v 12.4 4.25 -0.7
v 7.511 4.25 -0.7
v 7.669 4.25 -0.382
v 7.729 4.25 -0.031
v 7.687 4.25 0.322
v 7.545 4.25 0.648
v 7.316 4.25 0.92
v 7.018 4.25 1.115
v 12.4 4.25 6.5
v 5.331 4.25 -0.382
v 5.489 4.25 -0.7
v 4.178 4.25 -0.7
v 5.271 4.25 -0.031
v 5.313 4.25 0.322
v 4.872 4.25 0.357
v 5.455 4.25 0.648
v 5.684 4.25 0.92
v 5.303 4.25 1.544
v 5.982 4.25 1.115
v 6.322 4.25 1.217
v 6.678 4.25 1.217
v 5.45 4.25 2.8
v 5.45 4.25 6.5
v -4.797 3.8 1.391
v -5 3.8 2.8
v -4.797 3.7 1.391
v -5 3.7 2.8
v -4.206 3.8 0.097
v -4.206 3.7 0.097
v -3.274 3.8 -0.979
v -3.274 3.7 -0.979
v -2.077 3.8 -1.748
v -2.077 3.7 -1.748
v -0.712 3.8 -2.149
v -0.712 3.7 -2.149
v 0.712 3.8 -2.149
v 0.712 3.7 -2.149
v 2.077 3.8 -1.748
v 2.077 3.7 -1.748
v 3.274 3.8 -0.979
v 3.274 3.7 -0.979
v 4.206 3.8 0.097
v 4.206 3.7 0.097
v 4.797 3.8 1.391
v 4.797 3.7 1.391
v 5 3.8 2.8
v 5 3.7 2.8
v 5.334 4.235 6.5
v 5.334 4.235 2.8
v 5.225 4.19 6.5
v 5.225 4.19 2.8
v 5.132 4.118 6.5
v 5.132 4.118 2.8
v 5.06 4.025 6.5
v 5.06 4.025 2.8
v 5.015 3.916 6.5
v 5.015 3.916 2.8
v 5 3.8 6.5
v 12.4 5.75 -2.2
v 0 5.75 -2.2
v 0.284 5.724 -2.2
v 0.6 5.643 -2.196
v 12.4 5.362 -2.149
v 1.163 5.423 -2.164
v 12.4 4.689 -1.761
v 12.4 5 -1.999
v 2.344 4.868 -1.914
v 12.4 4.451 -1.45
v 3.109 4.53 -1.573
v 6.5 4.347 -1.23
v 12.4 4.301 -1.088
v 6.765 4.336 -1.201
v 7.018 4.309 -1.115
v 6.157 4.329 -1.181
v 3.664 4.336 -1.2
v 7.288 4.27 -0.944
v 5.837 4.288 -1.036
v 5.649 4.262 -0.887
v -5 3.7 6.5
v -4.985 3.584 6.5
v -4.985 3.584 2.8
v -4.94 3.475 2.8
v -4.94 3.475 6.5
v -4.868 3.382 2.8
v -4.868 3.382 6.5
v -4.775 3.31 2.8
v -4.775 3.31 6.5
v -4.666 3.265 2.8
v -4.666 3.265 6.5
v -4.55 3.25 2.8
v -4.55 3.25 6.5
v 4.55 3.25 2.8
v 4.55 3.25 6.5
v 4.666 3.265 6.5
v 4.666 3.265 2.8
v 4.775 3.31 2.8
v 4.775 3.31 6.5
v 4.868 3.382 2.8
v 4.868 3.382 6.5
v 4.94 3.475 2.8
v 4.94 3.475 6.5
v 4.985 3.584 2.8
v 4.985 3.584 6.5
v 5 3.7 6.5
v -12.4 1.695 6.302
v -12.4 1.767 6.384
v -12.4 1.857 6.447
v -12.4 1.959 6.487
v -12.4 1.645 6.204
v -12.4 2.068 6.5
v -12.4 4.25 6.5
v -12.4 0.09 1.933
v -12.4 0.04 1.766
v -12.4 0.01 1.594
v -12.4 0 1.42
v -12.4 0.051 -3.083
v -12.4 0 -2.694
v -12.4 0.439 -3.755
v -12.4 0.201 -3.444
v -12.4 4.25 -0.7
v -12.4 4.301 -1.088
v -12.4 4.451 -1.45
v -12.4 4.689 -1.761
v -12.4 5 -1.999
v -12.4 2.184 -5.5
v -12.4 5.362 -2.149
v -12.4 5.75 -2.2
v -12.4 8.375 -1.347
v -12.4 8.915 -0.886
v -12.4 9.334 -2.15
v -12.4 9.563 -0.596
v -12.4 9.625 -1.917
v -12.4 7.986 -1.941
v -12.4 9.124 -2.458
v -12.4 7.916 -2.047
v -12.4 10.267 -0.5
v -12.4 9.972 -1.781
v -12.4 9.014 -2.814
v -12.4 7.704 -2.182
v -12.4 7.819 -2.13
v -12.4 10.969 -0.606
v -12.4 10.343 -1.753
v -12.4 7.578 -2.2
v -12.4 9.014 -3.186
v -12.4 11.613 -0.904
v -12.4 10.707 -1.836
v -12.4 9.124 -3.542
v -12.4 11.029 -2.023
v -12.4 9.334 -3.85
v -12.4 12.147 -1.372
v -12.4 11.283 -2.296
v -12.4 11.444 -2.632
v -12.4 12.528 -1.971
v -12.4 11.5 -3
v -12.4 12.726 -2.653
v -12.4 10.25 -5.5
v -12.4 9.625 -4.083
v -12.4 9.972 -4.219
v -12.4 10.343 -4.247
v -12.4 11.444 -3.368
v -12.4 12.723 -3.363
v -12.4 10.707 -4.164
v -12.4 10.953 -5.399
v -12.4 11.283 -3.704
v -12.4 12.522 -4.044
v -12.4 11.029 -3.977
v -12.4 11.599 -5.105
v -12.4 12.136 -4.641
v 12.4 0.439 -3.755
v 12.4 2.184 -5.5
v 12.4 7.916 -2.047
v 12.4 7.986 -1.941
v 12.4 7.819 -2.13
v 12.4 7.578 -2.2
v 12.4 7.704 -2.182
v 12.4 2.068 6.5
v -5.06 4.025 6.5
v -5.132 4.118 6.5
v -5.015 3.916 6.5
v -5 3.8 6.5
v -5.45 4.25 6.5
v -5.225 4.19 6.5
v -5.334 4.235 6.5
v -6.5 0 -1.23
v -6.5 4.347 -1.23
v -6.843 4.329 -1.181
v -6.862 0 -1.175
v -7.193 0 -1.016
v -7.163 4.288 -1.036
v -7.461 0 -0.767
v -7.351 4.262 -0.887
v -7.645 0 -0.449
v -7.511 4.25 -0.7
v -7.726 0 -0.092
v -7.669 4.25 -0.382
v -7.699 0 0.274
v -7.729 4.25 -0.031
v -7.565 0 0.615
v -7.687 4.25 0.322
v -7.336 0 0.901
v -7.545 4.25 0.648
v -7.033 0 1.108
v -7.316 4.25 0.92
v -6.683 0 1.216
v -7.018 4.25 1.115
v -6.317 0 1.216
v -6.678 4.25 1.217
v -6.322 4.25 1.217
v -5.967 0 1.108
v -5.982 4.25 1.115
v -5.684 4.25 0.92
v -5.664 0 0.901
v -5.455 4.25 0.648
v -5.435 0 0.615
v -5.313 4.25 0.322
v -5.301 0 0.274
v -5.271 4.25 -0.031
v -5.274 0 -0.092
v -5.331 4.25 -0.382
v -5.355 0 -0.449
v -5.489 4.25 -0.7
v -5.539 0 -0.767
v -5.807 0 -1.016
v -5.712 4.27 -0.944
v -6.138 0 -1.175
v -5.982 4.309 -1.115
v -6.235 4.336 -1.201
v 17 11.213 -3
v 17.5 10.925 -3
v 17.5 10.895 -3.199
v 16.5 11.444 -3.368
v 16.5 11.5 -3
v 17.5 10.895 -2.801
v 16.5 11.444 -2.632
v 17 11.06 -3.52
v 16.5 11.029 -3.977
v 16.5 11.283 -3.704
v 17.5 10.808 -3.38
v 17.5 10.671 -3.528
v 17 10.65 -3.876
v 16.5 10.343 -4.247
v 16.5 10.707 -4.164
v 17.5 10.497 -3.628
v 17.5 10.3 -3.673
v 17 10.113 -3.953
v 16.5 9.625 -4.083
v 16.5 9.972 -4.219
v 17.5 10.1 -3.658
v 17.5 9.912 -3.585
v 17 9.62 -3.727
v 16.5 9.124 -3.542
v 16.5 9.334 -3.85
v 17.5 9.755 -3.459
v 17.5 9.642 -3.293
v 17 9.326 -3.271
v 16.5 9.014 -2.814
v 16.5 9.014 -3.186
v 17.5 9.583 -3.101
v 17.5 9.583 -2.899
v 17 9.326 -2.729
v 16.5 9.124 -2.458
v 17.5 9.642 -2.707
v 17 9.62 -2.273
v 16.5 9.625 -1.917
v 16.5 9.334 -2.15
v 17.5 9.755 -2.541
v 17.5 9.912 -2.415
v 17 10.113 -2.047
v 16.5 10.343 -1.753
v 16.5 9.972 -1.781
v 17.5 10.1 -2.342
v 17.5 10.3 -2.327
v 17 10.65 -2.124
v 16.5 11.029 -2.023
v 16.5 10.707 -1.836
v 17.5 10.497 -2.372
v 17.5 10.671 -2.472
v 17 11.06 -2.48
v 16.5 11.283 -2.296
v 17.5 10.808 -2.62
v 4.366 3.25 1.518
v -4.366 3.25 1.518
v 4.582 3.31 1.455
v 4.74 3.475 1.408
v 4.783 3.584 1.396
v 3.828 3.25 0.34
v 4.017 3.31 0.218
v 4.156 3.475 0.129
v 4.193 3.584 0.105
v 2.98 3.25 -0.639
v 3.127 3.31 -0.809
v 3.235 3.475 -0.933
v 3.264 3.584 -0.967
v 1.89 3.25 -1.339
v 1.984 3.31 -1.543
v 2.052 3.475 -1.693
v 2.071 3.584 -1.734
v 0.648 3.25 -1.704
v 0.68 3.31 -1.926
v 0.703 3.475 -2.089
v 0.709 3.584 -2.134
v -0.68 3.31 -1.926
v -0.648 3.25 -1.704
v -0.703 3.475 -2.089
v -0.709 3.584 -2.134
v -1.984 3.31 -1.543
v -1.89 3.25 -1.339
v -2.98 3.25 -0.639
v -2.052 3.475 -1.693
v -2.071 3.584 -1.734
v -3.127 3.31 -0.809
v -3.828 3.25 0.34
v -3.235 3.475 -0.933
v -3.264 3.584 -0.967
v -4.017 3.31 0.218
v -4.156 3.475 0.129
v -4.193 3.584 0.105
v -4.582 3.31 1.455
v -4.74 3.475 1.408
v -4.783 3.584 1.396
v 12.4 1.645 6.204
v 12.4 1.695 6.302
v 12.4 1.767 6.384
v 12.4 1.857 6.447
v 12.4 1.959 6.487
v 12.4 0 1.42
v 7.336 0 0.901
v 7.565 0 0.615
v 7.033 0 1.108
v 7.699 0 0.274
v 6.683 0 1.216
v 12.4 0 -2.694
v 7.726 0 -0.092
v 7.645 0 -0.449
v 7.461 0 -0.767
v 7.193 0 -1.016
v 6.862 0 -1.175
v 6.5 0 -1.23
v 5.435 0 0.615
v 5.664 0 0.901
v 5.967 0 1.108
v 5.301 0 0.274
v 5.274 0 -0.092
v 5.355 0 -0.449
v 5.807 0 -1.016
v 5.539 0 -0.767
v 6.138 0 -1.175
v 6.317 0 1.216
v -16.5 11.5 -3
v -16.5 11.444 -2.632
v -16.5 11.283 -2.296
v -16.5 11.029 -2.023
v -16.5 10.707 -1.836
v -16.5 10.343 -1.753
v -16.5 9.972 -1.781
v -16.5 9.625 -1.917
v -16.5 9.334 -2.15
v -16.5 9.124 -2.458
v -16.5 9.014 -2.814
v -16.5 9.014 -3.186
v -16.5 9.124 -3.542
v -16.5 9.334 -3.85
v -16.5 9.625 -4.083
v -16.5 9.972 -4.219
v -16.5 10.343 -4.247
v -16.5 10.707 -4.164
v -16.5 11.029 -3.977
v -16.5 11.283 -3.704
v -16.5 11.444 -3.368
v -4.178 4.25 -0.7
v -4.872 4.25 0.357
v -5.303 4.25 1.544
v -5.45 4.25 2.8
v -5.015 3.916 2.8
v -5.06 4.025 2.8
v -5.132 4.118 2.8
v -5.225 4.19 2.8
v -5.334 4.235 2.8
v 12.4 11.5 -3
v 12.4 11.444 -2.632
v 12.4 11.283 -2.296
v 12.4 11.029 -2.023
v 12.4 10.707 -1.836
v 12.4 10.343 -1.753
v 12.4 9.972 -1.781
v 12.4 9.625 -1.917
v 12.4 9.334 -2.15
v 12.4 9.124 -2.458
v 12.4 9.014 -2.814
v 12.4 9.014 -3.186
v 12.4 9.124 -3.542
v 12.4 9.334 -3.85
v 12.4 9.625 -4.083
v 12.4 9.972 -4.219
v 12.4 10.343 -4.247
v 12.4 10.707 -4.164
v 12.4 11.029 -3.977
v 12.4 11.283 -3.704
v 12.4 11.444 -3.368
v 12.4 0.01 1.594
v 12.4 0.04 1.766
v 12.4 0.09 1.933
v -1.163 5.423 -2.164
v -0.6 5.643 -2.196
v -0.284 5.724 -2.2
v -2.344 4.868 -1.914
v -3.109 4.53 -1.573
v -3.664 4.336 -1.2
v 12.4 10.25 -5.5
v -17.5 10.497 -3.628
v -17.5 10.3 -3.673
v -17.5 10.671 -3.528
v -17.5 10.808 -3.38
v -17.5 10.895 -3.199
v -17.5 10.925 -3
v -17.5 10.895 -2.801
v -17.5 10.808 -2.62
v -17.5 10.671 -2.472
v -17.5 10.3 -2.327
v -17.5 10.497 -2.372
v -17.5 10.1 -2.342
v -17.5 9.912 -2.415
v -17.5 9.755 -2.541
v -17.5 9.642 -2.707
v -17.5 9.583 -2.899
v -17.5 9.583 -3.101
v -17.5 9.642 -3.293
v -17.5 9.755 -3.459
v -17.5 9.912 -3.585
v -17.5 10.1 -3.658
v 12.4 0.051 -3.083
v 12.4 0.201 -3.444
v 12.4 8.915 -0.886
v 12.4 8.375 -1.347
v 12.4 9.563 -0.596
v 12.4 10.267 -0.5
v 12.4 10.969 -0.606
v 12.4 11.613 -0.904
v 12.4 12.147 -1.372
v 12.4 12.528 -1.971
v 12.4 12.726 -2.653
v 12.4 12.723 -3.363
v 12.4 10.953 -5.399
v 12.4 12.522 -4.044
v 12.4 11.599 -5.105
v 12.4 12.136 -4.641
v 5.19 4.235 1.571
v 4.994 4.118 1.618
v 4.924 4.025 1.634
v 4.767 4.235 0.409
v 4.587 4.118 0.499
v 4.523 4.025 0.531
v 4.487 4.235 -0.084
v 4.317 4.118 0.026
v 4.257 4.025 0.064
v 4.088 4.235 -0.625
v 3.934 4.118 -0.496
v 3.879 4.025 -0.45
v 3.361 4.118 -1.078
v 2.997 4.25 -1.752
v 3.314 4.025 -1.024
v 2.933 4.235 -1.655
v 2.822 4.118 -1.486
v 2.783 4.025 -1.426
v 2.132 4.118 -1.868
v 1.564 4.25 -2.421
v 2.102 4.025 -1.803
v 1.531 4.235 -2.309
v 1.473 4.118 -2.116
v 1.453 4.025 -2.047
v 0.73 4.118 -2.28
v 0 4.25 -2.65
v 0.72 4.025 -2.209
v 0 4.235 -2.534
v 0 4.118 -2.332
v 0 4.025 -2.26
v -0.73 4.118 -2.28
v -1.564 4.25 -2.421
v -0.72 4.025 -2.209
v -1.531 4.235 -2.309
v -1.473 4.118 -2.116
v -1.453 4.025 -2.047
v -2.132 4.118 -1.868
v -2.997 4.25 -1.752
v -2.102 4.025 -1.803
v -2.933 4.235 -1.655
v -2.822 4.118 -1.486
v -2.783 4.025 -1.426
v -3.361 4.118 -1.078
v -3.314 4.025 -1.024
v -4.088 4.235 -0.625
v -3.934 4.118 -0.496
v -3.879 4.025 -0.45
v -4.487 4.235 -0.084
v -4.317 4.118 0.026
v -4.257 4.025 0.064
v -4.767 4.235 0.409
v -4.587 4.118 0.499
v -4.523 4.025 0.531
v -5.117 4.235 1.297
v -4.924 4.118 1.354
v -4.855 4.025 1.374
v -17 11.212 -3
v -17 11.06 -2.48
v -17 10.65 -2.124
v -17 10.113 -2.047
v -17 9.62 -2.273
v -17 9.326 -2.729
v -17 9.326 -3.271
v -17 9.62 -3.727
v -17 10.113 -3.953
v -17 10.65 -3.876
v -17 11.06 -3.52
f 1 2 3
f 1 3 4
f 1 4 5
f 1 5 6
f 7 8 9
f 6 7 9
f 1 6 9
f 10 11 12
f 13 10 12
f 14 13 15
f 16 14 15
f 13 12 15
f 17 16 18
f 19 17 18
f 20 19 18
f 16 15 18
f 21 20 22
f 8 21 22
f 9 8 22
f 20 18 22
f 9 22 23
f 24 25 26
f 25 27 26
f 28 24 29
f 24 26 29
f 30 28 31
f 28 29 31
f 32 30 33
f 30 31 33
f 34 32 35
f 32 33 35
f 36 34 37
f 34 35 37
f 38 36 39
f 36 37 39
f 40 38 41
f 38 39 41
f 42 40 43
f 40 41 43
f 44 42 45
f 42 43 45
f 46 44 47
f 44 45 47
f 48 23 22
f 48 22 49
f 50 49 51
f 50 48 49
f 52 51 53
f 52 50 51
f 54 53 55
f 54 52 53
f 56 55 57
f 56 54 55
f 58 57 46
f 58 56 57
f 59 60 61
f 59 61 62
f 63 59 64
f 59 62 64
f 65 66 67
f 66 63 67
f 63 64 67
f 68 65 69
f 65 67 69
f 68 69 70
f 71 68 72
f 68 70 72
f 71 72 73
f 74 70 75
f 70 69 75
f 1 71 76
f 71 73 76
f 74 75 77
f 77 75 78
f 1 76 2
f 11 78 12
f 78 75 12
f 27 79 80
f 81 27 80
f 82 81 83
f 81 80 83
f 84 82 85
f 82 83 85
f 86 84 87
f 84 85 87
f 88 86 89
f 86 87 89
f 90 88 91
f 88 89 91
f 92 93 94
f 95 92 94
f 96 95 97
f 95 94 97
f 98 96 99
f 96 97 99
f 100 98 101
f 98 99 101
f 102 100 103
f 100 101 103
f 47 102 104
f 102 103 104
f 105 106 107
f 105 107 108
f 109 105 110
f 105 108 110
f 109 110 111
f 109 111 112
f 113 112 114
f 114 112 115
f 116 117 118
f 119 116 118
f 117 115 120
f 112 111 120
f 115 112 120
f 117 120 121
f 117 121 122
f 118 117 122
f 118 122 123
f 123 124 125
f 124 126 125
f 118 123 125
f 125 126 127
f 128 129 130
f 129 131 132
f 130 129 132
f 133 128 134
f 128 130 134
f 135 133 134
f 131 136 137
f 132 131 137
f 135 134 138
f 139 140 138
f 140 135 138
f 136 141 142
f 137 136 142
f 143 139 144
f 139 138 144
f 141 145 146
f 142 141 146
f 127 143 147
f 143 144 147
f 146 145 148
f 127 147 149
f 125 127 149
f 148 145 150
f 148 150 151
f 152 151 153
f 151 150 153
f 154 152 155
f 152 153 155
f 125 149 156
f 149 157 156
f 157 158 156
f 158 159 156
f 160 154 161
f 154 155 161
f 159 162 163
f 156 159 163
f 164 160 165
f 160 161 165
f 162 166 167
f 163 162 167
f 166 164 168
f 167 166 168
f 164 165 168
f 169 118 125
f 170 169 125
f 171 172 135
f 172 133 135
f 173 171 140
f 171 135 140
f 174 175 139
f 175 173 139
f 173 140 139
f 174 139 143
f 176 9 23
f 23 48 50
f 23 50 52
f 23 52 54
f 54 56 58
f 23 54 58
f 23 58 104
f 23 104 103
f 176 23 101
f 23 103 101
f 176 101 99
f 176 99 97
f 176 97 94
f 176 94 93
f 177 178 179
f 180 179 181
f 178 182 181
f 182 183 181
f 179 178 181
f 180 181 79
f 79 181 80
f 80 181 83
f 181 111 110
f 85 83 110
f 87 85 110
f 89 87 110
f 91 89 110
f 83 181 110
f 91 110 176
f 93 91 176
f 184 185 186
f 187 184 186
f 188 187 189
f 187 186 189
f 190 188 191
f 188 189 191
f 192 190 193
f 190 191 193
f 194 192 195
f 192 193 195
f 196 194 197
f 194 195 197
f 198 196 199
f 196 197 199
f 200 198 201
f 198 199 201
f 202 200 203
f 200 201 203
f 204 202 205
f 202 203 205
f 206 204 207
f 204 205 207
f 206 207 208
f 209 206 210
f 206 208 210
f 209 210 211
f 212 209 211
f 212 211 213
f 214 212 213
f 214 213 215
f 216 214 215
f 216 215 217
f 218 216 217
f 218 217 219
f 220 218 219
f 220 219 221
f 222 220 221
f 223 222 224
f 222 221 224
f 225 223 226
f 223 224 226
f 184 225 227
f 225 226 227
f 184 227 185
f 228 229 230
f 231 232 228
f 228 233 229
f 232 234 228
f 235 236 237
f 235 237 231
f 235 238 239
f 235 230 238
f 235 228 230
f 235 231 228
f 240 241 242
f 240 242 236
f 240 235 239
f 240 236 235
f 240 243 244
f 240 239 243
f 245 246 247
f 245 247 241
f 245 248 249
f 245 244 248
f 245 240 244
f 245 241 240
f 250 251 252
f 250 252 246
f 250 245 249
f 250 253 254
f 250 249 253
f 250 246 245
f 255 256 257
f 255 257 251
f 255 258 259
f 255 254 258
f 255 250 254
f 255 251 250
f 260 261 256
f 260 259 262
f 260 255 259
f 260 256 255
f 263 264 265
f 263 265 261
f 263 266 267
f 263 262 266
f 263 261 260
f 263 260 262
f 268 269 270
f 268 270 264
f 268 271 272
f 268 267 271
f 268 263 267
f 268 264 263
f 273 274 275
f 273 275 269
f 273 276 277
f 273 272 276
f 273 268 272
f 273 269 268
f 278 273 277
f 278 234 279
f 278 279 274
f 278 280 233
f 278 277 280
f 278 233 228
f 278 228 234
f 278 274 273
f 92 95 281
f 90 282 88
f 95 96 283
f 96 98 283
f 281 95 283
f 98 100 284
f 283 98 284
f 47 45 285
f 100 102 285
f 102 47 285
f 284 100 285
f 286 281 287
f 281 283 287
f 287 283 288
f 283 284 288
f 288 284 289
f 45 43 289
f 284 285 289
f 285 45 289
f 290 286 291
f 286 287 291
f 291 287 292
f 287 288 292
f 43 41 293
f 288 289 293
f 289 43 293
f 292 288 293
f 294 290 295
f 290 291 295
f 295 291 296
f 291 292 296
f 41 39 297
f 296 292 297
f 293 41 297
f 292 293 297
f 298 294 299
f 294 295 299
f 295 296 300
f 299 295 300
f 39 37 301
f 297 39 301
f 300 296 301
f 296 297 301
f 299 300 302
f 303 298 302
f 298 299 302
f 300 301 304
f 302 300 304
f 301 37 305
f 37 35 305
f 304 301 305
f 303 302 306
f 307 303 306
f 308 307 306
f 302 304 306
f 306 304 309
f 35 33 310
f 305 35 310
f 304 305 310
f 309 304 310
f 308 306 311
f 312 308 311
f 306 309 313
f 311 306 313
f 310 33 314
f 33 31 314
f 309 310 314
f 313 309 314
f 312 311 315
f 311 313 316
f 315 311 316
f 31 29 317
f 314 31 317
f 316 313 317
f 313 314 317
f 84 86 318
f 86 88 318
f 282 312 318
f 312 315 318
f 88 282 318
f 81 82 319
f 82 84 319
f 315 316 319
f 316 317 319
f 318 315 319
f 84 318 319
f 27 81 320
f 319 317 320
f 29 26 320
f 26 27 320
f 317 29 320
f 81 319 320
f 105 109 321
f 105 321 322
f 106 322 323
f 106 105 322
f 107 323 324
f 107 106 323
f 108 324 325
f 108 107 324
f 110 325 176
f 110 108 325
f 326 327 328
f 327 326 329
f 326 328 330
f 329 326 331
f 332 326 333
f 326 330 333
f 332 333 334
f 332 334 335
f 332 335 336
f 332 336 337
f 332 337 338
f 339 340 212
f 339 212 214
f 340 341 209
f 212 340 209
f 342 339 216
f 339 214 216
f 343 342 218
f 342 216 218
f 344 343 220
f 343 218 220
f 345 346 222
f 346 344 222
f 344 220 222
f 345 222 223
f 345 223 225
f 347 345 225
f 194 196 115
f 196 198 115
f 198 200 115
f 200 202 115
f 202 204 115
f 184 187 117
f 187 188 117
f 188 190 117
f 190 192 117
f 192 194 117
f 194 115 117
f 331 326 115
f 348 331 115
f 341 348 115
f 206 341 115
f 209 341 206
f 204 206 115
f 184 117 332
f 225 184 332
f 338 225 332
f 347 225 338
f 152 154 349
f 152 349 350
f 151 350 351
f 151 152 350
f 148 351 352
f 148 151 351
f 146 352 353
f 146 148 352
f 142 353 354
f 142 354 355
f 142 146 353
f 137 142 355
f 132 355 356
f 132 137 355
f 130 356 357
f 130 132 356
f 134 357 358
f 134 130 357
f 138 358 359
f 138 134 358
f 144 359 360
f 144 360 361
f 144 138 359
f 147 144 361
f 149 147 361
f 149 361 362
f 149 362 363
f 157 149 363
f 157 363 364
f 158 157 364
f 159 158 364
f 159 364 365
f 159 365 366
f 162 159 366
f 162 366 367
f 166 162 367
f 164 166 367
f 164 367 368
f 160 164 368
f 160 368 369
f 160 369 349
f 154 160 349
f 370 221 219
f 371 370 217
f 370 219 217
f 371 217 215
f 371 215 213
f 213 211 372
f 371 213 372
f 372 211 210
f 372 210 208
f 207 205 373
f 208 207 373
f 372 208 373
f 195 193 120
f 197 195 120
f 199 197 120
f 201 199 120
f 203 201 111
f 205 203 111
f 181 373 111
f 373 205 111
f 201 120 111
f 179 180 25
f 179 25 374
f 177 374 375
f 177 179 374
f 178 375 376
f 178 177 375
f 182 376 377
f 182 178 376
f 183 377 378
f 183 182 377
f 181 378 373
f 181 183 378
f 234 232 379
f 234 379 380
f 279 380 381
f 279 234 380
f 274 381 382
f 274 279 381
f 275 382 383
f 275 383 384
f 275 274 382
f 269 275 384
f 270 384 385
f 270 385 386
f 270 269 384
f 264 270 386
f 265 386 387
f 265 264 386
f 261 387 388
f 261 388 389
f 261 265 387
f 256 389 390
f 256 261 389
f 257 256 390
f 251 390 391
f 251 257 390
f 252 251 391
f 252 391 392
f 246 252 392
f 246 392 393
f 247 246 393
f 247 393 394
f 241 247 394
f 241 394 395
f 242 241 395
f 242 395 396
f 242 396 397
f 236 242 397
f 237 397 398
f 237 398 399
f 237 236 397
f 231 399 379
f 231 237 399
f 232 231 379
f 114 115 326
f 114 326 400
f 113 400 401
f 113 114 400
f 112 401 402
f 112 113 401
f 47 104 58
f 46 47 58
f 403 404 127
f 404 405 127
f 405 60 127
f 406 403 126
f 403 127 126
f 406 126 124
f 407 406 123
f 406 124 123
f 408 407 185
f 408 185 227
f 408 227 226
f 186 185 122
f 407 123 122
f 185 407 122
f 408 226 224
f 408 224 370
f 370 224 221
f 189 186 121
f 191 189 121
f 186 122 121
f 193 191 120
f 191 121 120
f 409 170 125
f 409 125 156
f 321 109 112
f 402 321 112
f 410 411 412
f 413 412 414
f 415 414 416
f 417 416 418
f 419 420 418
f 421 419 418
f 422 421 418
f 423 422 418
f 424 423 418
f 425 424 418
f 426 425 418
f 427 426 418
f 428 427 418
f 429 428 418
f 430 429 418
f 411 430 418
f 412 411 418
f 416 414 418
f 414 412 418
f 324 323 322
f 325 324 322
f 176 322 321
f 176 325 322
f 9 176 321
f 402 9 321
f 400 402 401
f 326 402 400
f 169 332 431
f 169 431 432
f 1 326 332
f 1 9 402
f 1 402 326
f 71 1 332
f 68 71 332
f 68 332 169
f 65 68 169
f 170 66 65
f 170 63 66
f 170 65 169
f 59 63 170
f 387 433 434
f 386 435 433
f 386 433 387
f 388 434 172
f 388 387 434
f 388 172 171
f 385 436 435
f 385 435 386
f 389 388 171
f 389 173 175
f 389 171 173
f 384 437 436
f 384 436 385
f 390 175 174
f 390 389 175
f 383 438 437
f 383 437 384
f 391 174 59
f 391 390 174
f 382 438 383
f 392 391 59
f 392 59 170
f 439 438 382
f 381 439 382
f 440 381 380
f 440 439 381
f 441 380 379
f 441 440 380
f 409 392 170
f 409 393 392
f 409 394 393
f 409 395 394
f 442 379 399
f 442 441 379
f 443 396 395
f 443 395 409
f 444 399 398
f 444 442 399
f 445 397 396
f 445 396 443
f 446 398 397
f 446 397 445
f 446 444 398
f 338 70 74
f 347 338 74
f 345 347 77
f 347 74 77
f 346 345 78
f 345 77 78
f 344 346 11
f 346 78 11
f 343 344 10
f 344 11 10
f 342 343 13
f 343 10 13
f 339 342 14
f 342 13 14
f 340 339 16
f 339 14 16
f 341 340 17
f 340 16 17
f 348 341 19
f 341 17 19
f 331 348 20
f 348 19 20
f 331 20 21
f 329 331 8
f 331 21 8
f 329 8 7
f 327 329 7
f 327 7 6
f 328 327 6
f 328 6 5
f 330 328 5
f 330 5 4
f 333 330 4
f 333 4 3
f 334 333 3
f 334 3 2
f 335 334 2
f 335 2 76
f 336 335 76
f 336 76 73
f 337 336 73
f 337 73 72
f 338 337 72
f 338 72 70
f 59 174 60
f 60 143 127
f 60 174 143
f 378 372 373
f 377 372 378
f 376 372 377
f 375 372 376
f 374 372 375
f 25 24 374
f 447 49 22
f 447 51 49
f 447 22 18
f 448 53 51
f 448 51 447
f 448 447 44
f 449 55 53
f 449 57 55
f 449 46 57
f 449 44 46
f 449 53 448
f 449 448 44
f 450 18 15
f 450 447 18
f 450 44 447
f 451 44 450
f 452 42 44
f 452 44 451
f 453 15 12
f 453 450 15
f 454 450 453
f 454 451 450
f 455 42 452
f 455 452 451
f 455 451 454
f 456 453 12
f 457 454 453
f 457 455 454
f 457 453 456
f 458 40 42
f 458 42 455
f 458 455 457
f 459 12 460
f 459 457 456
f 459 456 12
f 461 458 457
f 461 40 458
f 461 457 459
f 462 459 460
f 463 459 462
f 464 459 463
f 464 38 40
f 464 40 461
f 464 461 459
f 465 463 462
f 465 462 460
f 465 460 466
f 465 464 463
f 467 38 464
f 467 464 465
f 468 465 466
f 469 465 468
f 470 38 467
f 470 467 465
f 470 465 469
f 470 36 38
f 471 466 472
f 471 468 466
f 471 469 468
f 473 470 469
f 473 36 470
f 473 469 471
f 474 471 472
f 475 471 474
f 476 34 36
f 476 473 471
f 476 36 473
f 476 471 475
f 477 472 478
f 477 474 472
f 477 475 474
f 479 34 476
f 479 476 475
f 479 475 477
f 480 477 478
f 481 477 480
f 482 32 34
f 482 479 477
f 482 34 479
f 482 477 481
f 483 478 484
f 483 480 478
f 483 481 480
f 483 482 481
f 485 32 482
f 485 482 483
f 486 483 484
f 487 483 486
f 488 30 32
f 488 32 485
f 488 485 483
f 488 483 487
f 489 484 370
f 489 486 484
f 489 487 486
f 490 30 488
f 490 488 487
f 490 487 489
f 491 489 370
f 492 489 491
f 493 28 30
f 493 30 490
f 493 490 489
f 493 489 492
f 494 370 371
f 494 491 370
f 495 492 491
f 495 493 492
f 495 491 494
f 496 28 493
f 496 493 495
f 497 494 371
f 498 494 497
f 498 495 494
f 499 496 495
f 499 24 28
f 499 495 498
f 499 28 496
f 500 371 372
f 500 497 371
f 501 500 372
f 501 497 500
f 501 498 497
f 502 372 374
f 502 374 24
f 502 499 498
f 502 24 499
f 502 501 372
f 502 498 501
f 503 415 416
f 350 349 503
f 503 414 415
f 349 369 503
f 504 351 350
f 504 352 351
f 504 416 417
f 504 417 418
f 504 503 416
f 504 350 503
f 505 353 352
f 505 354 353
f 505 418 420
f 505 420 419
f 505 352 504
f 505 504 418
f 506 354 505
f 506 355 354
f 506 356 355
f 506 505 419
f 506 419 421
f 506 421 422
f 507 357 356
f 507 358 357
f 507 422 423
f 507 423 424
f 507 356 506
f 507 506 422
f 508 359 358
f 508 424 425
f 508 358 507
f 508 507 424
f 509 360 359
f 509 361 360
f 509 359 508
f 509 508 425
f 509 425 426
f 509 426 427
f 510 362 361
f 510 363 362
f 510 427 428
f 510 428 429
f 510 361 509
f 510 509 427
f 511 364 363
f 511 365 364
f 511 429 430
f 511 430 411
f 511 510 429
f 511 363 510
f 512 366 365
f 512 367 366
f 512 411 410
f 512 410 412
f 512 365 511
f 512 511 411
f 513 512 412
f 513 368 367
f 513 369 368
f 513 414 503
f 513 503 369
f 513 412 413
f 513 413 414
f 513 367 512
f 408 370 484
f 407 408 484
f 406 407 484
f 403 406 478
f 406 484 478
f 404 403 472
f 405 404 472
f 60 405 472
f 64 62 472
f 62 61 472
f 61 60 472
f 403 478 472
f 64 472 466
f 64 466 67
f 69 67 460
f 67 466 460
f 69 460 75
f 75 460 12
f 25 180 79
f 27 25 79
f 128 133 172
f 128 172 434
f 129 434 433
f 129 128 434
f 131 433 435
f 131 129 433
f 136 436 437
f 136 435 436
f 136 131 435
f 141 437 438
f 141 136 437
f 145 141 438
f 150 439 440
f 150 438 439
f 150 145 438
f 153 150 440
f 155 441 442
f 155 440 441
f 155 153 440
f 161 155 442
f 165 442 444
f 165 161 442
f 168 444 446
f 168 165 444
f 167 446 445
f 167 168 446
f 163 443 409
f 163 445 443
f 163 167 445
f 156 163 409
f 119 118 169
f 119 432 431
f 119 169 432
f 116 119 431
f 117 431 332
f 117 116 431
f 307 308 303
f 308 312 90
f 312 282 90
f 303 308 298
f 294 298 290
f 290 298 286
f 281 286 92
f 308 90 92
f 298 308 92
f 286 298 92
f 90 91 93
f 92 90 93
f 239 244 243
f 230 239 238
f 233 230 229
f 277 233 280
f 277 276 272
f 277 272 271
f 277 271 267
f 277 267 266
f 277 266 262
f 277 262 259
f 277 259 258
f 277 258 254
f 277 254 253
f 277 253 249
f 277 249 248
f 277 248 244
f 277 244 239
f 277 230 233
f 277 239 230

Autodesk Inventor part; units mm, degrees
sketch "Sketch_1" plane through (0, 0, 0) normal (1, 0, 0) x (0, 0, -1)
  line L0 (-6.5, 4.25) -> (-6.5, 2.0679)
  arc A0 (-6.5, 2.0679) -> (-6.2039, 1.645) centre (-6.05, 2.0679) ccw
  line L1 (-6.2039, 1.645) -> (-1.9329, 0.0905)
  arc A1 (-1.9329, 0.0905) -> (-1.4198, 0) centre (-1.4198, 1.5) ccw
  line L2 (-1.4198, 0) -> (2.6944, 0)
  arc A2 (2.6944, 0) -> (3.755, 0.4393) centre (2.6944, 1.5) ccw
  line L3 (3.755, 0.4393) -> (5.5, 2.1843)
  line L4 (5.5, 2.1843) -> (5.5, 10.25)
  arc A3 (5.5, 10.25) -> (1.9407, 7.9855) centre (3, 10.25) ccw
  arc A4 (2.2, 7.5779) -> (1.9407, 7.9855) centre (1.75, 7.5779) ccw
  line L5 (2.2, 7.5779) -> (2.2, 5.75)
  arc A5 (0.7, 4.25) -> (2.2, 5.75) centre (0.7, 5.75) ccw
  line L6 (0.7, 4.25) -> (-6.5, 4.25)
extrude "Extrusion1" add sketch "Sketch_1" along normal mid plane 24.8
sketch "Sketch2" plane through (-12.4, 0, -2.6944) normal (0, -1, 0) x (1, 0, 0)
  point P0 (18.9, 2.6944)
hole "Hole1" at (6.5, 0, 0) direction (0, 1, 0) diameter 2.459 depth 5.75
sketch "Sketch3" plane through (-12.4, 0, -2.6944) normal (0, -1, 0) x (1, 0, 0)
  point P0 (5.9, 2.6944)
hole "Hole2" at (-6.5, 0, 0) direction (0, 1, 0) diameter 2.459 depth 5.75
sketch "Sketch_5" plane through (0, 0, 6.5) normal (0, 0, 1) x (1, 0, 0)
  arc A0 (-5, 3.8) -> (-5.45, 4.25) centre (-5.45, 3.8) ccw
  line L0 (-5, 3.8) -> (-5, 3.7)
  arc A1 (-5, 3.7) -> (-4.55, 3.25) centre (-4.55, 3.7) ccw
  line L1 (-4.55, 3.25) -> (4.55, 3.25)
  arc A2 (4.55, 3.25) -> (5, 3.7) centre (4.55, 3.7) ccw
  line L2 (5, 3.7) -> (5, 3.8)
  arc A3 (5.45, 4.25) -> (5, 3.8) centre (5.45, 3.8) ccw
  line L3 (5.45, 4.25) -> (5.45, 7.25)
  line L4 (5.45, 7.25) -> (-5.45, 7.25)
  line L5 (-5.45, 7.25) -> (-5.45, 4.25)
extrude "Extrusion2" cut sketch "Sketch_5" against normal blind 3.7
sketch "Sketch_6" plane through (0, 0, 2.8) normal (0, 0, 1) x (1, 0, 0)
  line L0 (0, 3.25) -> (0, 7.25)
  line L1 (0, 7.25) -> (4.55, 7.25)
  line L2 (4.55, 7.25) -> (5.45, 4.25)
  arc A0 (5.45, 4.25) -> (5, 3.8) centre (5.45, 3.8) ccw
  line L3 (5, 3.8) -> (5, 3.7)
  arc A1 (4.55, 3.25) -> (5, 3.7) centre (4.55, 3.7) ccw
  line L4 (4.55, 3.25) -> (0, 3.25)
  line L5 (0, 3.25) -> (0, 7.25)
revolve "Revolution1" cut sketch "Sketch_6" angle 180 about axis through (0, 3.25, 2.8) along (0, 1, 0)
sketch "Sketch_8" plane through (0, 0, -3) normal (0, 0, 1) x (1, 0, 0)
  line L0 (17.5, 10.25) -> (-17.5, 10.25)
  line L1 (-17.5, 10.25) -> (-17.5, 10.925)
  line L2 (-17.5, 10.925) -> (-16.5, 11.5)
  line L3 (-16.5, 11.5) -> (16.5, 11.5)
  line L4 (16.5, 11.5) -> (17.5, 10.925)
  line L5 (17.5, 10.925) -> (17.5, 10.25)
  line L6 (17.5, 10.25) -> (-17.5, 10.25)
revolve "Revolution2" add sketch "Sketch_8" angle 360 about axis through (17.5, 10.25, -3) along (1, 0, 0)
ref_plane "DECKEL_XY" through (0, 10.25, -3) normal (1, 0, 0) x (0, 0, -1)
ref_plane "DECKEL_YZ" through (0, 10.25, -3) normal (0, 0, -1) x (0, 1, 0)
ref_plane "DECKEL_ZX" through (0, 10.25, -3) normal (0, 1, 0) x (1, 0, 0)
ref_plane "HINGE_XY" through (0, 0, 0) normal (1, 0, 0) x (0, 0, -1)
ref_plane "HINGE_YZ" through (0, 0, 0) normal (0, 0, -1) x (0, 1, 0)
ref_plane "HINGE_ZX" through (0, 0, 0) normal (0, 1, 0) x (1, 0, 0)
properties part number "1301.000_4_(1)"
